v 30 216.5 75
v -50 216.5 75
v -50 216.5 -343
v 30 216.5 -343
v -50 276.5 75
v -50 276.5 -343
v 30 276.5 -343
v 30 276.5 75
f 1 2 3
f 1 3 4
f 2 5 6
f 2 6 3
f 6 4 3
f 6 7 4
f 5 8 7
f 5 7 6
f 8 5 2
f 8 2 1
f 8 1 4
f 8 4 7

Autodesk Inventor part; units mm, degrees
ref_plane "YZ Plane" through (0, 0, 0) normal (1, 0, 0) x (0, 1, 0)
ref_plane "XZ Plane" through (0, 0, 0) normal (0, 1, 0) x (-1, 0, 0)
sketch "Sketch1" plane through (0, 0, 0) normal (0, 0, 1) x (1, 0, 0)
  line L0 (30, 216.5) -> (-50, 216.5)
  line L1 (-50, 216.5) -> (-50, 276.5)
  line L2 (-50, 276.5) -> (30, 276.5)
  line L3 (30, 276.5) -> (30, 216.5)
  point P0 (0, 0)
  dimension "d0" = 60
  dimension "d1" = 80
ref_plane "Work Plane1" through (-30, -216.5, -268) normal (0, 0, -1) x (0, 1, 0)
extrude "Extrusion1" add sketch "Sketch1" against normal up to surface (268 mm away)
sketch "Sketch2" plane through (0, 0, 0) normal (0, 0, 1) x (1, 0, 0)
  line L0 (30, 216.5) -> (-50, 216.5) projected
  line L1 (30, 276.5) -> (30, 216.5) projected
  line L2 (-50, 276.5) -> (30, 276.5) projected
  line L3 (-50, 216.5) -> (-50, 276.5) projected
  line L4 (30, 216.5) -> (-50, 216.5) projected
  line L5 (30, 276.5) -> (30, 216.5) projected
  line L6 (-50, 276.5) -> (30, 276.5) projected
  line L7 (-50, 216.5) -> (-50, 276.5) projected
  point P0 (0, 0)
extrude "Extrusion2" add sketch "Sketch2" along normal blind 75
sketch "Sketch3" plane through (30, 216.5, -268) normal (0, 0, -1) x (-1, 0, 0)
  line L0 (0, 0) -> (0, 60) projected
  line L1 (80, 0) -> (0, 0) projected
  line L2 (80, 60) -> (80, 0) projected
  line L3 (0, 60) -> (80, 60) projected
  line L4 (0, 0) -> (0, 60) projected
  line L5 (80, 0) -> (0, 0) projected
  line L6 (80, 60) -> (80, 0) projected
  line L7 (0, 60) -> (80, 60) projected
  point P0 (30, -216.5)
extrude "Extrusion3" add sketch "Sketch3" along normal blind 75
properties part number "Bottom_Wheel_Supp" material "Wood"
